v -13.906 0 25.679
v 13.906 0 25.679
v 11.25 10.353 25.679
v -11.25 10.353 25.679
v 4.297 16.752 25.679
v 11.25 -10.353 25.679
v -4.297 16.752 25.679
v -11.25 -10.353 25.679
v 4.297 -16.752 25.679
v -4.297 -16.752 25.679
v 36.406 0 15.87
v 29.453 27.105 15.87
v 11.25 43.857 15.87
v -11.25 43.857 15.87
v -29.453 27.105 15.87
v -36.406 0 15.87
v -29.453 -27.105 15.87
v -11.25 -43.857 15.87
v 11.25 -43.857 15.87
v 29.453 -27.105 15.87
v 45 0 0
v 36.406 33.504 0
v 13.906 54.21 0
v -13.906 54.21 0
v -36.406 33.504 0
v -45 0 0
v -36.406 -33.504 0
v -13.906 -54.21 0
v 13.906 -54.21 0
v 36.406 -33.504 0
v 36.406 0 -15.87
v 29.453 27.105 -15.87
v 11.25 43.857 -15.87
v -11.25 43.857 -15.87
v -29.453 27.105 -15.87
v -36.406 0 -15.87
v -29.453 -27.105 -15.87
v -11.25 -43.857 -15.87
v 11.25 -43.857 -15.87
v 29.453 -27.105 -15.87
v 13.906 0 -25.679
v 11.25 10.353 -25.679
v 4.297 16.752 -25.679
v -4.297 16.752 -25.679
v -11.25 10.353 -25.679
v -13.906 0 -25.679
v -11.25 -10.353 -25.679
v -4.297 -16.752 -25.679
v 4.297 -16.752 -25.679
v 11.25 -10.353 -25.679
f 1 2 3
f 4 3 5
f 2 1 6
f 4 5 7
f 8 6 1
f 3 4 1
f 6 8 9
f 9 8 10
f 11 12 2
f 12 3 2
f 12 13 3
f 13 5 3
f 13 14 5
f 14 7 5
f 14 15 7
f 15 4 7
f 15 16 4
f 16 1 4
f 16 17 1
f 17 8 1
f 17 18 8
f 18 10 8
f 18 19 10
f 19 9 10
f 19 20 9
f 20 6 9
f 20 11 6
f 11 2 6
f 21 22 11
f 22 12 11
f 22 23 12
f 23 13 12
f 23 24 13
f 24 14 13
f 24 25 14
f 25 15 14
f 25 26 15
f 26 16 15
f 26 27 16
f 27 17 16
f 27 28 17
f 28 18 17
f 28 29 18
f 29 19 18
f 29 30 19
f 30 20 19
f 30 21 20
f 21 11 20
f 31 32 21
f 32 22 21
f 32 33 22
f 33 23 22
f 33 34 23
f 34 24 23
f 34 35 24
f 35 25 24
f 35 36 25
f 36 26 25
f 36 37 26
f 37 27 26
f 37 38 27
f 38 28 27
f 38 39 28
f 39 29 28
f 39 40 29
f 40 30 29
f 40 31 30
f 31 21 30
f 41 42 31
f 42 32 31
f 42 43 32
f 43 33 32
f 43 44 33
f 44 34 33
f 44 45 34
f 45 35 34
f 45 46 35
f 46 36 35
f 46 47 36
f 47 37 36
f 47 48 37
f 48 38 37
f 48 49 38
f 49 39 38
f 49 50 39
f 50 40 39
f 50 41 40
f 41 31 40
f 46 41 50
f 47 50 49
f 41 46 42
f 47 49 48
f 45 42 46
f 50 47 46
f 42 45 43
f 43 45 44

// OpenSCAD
// Generated by SolidPython 1.0.1 on 2020-07-29 00:46:52


scale(v = [15, 19, 9]) {
	sphere(r = 3);
}
/***********************************************
*********      SolidPython code:      **********
************************************************
 
# import packages: SolidPython
from solid import *
from solid.utils import *
from itertools import chain, combinations, permutations


class Resize:

    def __init__(self, scad_file):
        self.scad_file = scad_file
        #self.scad_file = import_scad(scad_file)
        # cone/cylinder param:
        self.r1 = 0
        self.r2 = 0
        self.h = 0
        # rectangular prism param:
        self.w = 0
        self.l = 0
        # ellipse param:
        self.r = 0

    # import OpenScad code (file name corresponds to shape)


    # classify shape + parameters
    def assign(self, param1, param2, param3):
        if self.scad_file == 'cone.scad':
            self.r1 = param1
            self.r2 = param2
            self.h = param3
        elif self.scad_file == 'cylinder.scad':
            self.r1 = param1
            self.r2 = param2
            self.h = param3
        elif self.scad_file == 'rectangularPrism.scad':
            self.h = param1
            self.l = param2
            self.w = param3
        else:
            self.r = param1
            self.h = param2

    # resize parameters
    def iterate(self):
        x = range(3, 20, 2)
        i = 1
        if self.scad_file == 'cone.scad':
            tempList = list(permutations(x, 2))
            for temp in tempList:
                param1 = temp[0]
                param2 = temp[1]
                filepath = 'produced_scad_files/' + 'cone' + str(param1) + '_' + str(param2) + '_' + '.scad'
                scad_render_to_file(cylinder(h=param1, r1=param2, r2=0), filepath)

        elif self.scad_file == 'cylinder.scad':
            tempList = list(permutations(x, 3))
            for temp in tempList:
                param1 = temp[0]
                param2 = temp[1]
                filepath = 'produced_scad_files/' + 'cylinder' + str(param1) + '_' + str(param2) + '_' + '.scad'
                scad_render_to_file(cylinder(h=param1, r1=param2, r2=param2), filepath)

        elif self.scad_file == 'rectangularPrism.scad':
            tempList = list(permutations(x, 3))
            for temp in tempList:
                param1 = temp[0]
                param2 = temp[1]
                param3 = temp[2]
                filepath = 'produced_scad_files/' + 'rectangularPrism' + str(param1) + '_' + str(param2) + '_' + str(
                    param3) + '.scad'
                scad_render_to_file(cube(size=(param1, param2, param3)), filepath)

        elif self.scad_file == 'ellipse.scad':
            tempList = list(permutations(x, 4))
            for temp in tempList:
                param1 = temp[0]
                param2 = temp[1]
                param3 = temp[2]
                param4 = temp[3]
                filepath = 'produced_scad_files/' + 'ellipse' + str(param1) + '_' + str(param2) + '_' + str(param3) + '_' + str(param4) + '.scad'
                scad_render_to_file(scale([param1, param2, param3])(sphere(r=param4)), filepath)

    def render_to_scadfile(self):
        scad_render_to_file(scad, 'example.scad') 
 
************************************************/
